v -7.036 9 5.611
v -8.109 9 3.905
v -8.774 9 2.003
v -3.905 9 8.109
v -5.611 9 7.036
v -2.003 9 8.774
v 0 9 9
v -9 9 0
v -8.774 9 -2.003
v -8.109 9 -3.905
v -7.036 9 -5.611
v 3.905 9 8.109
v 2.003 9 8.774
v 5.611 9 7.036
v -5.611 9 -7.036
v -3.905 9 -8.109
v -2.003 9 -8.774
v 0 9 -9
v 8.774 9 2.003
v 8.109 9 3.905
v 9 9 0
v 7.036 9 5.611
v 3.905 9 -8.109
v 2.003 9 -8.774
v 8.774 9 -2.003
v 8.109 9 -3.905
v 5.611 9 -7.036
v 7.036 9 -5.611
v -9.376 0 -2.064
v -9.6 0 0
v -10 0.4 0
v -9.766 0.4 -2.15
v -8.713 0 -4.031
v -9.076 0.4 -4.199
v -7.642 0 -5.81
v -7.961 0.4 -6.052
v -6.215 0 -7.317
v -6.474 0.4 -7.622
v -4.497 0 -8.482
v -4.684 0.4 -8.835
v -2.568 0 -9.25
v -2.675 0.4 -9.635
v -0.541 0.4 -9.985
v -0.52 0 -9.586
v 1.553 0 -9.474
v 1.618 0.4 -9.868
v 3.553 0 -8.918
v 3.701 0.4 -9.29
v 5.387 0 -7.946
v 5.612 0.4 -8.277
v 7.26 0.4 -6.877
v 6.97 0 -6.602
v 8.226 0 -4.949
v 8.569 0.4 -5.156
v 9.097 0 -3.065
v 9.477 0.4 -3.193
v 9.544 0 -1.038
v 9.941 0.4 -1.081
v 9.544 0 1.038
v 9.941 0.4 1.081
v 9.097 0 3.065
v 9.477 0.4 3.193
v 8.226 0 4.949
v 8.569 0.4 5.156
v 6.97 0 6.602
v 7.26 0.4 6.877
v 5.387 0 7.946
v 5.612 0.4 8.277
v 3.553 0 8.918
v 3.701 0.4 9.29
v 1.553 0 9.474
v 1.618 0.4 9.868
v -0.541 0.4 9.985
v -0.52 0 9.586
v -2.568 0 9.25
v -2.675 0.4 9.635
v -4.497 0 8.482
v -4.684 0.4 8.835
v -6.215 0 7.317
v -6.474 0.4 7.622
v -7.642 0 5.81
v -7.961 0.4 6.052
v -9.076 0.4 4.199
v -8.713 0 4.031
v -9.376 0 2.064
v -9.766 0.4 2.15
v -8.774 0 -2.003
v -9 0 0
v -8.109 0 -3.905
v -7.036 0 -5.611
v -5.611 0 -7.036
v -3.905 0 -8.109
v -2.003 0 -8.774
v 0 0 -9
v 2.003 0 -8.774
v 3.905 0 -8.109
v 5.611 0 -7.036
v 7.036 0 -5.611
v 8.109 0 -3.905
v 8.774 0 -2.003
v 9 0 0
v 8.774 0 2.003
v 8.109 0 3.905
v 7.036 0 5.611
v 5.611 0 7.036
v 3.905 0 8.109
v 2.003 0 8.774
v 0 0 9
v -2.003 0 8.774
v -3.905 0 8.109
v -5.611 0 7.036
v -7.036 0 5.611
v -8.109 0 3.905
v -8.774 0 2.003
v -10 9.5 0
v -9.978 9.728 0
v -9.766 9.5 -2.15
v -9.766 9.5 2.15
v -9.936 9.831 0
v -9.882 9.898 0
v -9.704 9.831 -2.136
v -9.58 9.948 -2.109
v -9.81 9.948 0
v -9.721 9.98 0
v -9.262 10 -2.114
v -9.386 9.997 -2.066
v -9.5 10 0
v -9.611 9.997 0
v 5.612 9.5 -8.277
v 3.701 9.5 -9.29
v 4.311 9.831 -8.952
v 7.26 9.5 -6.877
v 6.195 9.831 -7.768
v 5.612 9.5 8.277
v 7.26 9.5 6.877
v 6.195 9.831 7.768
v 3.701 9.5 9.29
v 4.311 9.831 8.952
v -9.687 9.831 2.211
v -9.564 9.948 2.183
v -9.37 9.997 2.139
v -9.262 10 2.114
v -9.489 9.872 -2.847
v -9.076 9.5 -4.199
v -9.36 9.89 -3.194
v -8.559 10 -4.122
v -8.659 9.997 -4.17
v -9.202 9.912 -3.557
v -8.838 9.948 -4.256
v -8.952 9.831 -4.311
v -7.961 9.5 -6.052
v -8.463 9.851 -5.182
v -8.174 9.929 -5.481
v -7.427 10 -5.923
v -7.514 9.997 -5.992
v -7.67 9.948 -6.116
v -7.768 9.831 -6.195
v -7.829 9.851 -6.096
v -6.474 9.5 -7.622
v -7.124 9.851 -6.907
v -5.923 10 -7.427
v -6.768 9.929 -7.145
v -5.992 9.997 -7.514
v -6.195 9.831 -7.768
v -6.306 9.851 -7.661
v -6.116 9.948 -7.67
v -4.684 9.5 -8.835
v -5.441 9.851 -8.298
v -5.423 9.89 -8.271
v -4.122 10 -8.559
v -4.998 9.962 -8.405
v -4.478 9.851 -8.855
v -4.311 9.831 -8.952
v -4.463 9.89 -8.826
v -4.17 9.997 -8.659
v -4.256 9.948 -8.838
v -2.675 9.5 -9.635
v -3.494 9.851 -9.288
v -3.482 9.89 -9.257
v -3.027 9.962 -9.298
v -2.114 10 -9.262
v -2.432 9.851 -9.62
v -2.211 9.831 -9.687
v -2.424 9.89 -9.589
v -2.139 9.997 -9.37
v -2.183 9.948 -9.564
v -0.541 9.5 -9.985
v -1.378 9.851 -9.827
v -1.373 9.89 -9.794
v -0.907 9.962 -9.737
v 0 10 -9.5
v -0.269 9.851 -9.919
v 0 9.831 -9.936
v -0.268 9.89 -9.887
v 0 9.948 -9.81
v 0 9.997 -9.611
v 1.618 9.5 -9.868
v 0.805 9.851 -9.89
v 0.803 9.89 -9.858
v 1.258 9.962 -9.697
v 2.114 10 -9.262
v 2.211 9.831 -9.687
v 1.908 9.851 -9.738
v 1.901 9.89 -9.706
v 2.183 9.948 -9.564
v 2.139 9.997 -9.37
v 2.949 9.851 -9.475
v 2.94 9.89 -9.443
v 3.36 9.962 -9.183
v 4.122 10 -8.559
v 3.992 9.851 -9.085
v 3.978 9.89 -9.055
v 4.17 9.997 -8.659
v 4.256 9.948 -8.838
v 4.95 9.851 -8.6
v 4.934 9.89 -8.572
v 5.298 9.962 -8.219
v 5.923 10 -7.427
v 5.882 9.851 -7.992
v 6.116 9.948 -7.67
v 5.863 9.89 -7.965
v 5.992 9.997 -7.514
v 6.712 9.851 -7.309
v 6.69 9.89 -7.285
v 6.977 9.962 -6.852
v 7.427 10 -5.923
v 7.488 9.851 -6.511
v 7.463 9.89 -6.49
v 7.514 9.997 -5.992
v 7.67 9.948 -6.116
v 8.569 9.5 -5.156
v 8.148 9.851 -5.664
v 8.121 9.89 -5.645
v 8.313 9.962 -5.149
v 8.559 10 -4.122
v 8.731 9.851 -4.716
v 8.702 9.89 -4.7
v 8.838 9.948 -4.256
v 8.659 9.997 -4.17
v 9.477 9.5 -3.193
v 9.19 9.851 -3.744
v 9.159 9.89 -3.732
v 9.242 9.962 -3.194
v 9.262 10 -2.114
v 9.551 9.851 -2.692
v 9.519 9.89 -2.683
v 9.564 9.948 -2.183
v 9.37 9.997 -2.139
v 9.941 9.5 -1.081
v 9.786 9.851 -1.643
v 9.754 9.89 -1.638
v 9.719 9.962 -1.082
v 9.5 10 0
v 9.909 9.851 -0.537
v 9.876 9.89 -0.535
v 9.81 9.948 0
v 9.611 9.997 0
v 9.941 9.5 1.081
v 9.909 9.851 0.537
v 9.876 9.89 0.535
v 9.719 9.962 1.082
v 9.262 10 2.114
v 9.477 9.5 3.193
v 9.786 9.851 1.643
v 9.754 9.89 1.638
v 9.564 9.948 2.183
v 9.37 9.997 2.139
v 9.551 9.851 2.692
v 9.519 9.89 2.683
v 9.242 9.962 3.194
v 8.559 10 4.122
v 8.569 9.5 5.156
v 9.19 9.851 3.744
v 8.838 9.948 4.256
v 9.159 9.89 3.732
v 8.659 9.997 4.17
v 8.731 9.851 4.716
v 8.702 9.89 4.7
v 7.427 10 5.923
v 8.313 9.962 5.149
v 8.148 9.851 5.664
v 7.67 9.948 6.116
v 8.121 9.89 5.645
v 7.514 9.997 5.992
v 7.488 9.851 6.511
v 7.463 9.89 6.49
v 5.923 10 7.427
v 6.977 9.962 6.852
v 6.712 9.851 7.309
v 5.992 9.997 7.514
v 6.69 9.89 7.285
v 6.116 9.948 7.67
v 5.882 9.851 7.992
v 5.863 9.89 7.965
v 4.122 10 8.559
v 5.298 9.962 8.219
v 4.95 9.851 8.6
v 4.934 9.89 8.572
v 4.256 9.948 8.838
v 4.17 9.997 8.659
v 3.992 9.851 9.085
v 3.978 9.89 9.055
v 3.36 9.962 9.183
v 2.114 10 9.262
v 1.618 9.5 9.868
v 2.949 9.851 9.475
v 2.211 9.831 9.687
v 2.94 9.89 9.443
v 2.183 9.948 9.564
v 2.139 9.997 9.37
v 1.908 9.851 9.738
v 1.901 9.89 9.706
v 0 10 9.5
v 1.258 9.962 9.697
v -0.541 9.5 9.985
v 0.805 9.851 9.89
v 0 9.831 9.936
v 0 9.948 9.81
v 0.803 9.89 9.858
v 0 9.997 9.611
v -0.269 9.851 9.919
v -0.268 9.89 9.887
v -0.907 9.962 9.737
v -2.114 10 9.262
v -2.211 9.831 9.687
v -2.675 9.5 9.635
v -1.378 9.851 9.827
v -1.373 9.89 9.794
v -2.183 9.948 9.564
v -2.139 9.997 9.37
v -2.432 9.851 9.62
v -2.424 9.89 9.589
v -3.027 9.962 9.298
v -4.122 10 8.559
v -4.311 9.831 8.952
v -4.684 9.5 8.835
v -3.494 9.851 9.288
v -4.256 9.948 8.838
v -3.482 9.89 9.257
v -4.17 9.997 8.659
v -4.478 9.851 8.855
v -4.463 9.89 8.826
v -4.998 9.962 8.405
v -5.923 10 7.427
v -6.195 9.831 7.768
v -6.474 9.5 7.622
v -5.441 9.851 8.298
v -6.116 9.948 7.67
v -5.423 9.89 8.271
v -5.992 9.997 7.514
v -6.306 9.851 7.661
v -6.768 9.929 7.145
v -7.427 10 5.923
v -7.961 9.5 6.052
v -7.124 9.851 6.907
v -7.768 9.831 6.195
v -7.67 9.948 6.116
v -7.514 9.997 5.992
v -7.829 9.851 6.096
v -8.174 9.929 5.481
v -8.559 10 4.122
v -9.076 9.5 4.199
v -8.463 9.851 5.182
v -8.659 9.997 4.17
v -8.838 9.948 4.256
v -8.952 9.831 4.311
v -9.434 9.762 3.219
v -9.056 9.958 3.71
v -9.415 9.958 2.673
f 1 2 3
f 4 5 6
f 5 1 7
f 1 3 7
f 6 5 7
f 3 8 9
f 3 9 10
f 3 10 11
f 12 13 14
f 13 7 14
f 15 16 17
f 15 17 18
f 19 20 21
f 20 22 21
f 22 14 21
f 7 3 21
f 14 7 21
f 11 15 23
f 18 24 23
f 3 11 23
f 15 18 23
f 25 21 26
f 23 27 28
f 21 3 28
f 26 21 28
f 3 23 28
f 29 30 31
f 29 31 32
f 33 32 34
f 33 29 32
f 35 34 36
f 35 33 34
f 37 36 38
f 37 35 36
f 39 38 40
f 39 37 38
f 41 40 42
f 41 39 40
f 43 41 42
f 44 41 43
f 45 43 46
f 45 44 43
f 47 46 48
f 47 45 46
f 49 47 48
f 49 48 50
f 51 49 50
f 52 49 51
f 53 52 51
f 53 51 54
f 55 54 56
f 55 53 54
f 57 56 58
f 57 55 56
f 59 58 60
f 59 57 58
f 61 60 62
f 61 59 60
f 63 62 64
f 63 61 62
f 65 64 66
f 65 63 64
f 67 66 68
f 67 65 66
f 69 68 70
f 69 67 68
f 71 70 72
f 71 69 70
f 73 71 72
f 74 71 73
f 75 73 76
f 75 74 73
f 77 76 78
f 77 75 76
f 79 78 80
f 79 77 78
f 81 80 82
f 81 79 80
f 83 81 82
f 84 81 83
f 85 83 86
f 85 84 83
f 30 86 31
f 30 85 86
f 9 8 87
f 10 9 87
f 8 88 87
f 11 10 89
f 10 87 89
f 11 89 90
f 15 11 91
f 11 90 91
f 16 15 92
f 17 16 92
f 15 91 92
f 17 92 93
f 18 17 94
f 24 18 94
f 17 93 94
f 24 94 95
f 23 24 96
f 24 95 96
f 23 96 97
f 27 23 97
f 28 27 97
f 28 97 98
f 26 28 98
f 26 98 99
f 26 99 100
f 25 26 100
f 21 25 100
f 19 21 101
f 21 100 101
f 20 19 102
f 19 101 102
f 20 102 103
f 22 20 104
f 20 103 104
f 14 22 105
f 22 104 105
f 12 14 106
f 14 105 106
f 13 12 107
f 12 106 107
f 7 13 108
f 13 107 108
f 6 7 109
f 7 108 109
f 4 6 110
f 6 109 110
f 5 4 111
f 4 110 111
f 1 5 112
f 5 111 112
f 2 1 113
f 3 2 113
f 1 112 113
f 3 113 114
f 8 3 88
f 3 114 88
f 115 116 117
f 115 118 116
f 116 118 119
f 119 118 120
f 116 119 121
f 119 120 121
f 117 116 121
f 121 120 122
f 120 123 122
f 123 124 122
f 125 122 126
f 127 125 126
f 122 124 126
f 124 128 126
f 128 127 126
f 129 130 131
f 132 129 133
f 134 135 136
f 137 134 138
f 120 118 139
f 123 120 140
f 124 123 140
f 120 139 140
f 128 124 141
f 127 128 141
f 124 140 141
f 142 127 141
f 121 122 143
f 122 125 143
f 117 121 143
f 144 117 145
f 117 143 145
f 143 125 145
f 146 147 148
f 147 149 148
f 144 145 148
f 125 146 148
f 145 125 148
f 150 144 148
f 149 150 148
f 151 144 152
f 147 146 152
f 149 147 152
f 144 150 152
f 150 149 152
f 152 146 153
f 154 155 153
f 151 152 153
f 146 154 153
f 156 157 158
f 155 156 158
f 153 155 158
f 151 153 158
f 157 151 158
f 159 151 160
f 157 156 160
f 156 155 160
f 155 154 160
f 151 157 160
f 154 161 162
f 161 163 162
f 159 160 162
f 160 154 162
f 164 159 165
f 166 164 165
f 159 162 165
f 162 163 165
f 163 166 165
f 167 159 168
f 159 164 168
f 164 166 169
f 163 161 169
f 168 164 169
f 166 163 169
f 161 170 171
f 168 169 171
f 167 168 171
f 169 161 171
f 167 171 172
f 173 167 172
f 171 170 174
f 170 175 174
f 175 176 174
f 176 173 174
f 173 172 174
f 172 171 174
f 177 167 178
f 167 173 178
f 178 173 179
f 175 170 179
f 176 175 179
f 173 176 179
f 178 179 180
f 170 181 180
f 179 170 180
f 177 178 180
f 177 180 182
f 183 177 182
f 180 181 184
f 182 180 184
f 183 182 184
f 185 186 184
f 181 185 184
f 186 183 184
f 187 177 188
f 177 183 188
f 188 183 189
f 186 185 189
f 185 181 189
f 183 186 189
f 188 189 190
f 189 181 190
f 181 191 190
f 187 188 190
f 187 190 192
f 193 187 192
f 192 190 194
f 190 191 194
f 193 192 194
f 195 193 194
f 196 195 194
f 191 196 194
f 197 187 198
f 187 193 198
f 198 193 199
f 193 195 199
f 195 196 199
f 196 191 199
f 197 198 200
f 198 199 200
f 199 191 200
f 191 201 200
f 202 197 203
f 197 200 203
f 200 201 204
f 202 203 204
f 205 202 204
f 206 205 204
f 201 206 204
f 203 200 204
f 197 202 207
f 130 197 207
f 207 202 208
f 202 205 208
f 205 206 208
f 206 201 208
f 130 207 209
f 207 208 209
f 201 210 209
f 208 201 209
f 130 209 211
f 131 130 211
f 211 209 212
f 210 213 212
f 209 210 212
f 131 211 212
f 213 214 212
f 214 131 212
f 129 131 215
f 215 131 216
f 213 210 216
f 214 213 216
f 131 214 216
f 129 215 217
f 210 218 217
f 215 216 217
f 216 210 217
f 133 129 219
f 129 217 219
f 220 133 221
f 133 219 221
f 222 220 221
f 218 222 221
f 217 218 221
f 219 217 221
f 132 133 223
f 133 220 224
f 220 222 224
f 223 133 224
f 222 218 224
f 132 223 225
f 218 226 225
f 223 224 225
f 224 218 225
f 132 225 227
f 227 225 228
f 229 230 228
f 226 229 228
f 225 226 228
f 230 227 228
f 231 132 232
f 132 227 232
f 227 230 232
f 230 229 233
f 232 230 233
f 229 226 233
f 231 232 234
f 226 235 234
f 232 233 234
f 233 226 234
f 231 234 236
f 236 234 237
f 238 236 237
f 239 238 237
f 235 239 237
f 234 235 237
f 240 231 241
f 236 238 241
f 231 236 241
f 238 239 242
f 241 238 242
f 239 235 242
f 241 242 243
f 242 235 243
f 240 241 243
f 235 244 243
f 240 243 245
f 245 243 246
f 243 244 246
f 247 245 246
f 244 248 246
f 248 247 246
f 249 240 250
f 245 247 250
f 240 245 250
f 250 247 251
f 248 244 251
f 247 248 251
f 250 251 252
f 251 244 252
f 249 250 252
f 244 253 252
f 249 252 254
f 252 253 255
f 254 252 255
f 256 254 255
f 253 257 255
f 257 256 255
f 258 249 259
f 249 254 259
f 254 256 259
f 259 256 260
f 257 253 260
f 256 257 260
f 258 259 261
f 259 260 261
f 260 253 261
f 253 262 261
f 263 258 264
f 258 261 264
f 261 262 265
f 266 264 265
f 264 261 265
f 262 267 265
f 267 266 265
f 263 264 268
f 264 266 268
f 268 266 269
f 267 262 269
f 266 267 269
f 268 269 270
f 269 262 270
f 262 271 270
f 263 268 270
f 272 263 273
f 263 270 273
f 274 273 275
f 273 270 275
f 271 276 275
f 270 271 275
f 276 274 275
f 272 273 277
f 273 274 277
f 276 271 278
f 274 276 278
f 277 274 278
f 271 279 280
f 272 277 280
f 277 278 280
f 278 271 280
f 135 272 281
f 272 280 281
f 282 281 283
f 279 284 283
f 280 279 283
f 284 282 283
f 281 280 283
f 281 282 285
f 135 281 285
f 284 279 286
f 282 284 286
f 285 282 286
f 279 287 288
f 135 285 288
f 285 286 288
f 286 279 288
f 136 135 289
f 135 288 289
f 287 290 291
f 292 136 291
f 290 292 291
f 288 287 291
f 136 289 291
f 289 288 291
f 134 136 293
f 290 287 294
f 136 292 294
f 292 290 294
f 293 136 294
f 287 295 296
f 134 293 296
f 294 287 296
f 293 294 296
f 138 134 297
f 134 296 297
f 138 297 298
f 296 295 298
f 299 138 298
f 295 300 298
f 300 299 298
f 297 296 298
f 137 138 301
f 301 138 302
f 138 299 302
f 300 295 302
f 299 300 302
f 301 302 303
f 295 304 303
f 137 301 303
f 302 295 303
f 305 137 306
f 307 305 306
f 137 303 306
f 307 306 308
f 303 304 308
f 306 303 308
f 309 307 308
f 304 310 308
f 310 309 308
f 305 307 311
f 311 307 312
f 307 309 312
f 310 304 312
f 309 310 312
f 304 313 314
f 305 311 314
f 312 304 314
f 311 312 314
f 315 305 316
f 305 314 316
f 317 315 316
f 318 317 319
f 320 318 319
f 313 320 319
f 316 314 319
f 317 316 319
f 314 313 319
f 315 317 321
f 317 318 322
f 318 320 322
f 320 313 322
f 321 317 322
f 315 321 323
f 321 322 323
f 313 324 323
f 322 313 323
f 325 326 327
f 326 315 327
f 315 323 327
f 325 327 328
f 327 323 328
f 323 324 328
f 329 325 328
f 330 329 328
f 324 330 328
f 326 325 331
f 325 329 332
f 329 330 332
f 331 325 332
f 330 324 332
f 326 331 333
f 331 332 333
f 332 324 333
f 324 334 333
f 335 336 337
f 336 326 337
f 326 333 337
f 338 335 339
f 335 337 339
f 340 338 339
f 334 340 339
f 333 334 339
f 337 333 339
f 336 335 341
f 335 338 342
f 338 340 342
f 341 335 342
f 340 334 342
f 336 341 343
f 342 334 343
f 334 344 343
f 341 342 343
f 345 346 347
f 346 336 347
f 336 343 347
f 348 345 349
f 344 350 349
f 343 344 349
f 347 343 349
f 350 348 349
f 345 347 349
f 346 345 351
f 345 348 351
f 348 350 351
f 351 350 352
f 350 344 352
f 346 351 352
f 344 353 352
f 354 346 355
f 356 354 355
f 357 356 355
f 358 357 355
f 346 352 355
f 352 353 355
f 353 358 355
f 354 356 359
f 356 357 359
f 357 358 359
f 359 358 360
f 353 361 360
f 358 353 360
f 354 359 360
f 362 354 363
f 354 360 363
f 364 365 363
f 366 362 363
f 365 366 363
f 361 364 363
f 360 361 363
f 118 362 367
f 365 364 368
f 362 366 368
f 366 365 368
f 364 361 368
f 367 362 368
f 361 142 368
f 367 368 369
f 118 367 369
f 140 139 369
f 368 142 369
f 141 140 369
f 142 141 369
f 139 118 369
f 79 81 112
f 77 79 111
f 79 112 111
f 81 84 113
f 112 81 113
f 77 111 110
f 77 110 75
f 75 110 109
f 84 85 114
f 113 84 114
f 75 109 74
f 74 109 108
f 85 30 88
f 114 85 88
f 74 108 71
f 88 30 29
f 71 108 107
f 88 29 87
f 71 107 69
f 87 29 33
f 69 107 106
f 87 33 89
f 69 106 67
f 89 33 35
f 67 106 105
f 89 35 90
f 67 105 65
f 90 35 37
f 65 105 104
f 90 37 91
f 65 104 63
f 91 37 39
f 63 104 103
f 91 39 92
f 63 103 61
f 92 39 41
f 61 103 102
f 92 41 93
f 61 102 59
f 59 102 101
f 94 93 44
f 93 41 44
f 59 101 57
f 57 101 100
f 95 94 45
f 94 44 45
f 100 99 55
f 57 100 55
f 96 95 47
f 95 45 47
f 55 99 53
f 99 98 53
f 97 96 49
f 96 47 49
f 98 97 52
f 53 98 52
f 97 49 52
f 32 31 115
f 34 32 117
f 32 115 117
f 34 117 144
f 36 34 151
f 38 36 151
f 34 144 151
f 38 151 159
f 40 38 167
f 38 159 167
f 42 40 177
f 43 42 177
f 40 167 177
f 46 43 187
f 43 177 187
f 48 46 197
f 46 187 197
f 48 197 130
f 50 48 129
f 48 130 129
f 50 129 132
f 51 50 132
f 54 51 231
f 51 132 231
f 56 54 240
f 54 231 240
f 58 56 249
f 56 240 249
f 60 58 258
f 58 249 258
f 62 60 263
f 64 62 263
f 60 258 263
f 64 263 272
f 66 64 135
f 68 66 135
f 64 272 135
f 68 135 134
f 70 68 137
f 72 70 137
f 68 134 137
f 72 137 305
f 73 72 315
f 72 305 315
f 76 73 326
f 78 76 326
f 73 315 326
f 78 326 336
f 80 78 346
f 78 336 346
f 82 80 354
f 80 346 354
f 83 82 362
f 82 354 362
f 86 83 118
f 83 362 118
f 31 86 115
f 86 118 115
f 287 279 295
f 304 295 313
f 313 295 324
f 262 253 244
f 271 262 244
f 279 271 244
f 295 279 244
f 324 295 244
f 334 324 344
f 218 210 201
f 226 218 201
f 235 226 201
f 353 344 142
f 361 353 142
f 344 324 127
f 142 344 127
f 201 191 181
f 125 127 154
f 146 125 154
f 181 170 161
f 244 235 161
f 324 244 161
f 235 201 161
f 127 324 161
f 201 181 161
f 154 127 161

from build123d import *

# Parameters (mm, degrees)
FILLET1_SIZE  = 0.5
CHAMFER1_SIZE = 0.4


with BuildPart() as part:
    # Sketch1 → Revolve1 (revolve)
    with BuildSketch(Plane.XY, mode=Mode.PRIVATE) as revolve1_sk:
        Polygon((10, 0), (10, 10), (0, 10), (0, 9), (9, 9), (9, 0), align=None)
    revolve(revolve1_sk.sketch.rotate(Axis((0, 10, 0), (0, -1, 0)), 180), axis=Axis((0, 10, 0), (0, -1, 0)))

    # Fillet1
    # a fillet whose section is not a circle: 0.5 mm, written as the material it takes off along each edge
    with BuildSketch(Plane(origin=(0, 10, 0), x_dir=(-1, 0, 0), z_dir=(0, 0, 1))) as fillet1_piece_1:
        with BuildLine():
            add(Edge.make_bspline([(10, FILLET1_SIZE), (10, FILLET1_SIZE * 0.831801948466), (10, FILLET1_SIZE * 0.663603896932), (10 - FILLET1_SIZE * 0.0716919198361, FILLET1_SIZE * 0.292893218813), (10 - FILLET1_SIZE * 0.292893218813, FILLET1_SIZE * 0.0716919198361), (10 - FILLET1_SIZE * 0.663603896932, 0), (10 - FILLET1_SIZE * 0.831801948466, 0), (10 - FILLET1_SIZE, 0)], knots=[0, 0, 0, 0, 0, 0, 0.5, 0.5, 1, 1, 1, 1, 1, 1], degree=5))
            Line((10 - FILLET1_SIZE, 0), (10, 0))
            Line((10, 0), (10, FILLET1_SIZE))
        make_face()
    revolve(axis=Axis((0, 10, 0), (0, -1, 0)), mode=Mode.SUBTRACT)

    # Chamfer1
    chamfer1_edges = [part.edges().sort_by_distance(p)[0] for p in [
        (10, 0, 0),
    ]]
    chamfer(chamfer1_edges, length=CHAMFER1_SIZE)


solid = part.part
